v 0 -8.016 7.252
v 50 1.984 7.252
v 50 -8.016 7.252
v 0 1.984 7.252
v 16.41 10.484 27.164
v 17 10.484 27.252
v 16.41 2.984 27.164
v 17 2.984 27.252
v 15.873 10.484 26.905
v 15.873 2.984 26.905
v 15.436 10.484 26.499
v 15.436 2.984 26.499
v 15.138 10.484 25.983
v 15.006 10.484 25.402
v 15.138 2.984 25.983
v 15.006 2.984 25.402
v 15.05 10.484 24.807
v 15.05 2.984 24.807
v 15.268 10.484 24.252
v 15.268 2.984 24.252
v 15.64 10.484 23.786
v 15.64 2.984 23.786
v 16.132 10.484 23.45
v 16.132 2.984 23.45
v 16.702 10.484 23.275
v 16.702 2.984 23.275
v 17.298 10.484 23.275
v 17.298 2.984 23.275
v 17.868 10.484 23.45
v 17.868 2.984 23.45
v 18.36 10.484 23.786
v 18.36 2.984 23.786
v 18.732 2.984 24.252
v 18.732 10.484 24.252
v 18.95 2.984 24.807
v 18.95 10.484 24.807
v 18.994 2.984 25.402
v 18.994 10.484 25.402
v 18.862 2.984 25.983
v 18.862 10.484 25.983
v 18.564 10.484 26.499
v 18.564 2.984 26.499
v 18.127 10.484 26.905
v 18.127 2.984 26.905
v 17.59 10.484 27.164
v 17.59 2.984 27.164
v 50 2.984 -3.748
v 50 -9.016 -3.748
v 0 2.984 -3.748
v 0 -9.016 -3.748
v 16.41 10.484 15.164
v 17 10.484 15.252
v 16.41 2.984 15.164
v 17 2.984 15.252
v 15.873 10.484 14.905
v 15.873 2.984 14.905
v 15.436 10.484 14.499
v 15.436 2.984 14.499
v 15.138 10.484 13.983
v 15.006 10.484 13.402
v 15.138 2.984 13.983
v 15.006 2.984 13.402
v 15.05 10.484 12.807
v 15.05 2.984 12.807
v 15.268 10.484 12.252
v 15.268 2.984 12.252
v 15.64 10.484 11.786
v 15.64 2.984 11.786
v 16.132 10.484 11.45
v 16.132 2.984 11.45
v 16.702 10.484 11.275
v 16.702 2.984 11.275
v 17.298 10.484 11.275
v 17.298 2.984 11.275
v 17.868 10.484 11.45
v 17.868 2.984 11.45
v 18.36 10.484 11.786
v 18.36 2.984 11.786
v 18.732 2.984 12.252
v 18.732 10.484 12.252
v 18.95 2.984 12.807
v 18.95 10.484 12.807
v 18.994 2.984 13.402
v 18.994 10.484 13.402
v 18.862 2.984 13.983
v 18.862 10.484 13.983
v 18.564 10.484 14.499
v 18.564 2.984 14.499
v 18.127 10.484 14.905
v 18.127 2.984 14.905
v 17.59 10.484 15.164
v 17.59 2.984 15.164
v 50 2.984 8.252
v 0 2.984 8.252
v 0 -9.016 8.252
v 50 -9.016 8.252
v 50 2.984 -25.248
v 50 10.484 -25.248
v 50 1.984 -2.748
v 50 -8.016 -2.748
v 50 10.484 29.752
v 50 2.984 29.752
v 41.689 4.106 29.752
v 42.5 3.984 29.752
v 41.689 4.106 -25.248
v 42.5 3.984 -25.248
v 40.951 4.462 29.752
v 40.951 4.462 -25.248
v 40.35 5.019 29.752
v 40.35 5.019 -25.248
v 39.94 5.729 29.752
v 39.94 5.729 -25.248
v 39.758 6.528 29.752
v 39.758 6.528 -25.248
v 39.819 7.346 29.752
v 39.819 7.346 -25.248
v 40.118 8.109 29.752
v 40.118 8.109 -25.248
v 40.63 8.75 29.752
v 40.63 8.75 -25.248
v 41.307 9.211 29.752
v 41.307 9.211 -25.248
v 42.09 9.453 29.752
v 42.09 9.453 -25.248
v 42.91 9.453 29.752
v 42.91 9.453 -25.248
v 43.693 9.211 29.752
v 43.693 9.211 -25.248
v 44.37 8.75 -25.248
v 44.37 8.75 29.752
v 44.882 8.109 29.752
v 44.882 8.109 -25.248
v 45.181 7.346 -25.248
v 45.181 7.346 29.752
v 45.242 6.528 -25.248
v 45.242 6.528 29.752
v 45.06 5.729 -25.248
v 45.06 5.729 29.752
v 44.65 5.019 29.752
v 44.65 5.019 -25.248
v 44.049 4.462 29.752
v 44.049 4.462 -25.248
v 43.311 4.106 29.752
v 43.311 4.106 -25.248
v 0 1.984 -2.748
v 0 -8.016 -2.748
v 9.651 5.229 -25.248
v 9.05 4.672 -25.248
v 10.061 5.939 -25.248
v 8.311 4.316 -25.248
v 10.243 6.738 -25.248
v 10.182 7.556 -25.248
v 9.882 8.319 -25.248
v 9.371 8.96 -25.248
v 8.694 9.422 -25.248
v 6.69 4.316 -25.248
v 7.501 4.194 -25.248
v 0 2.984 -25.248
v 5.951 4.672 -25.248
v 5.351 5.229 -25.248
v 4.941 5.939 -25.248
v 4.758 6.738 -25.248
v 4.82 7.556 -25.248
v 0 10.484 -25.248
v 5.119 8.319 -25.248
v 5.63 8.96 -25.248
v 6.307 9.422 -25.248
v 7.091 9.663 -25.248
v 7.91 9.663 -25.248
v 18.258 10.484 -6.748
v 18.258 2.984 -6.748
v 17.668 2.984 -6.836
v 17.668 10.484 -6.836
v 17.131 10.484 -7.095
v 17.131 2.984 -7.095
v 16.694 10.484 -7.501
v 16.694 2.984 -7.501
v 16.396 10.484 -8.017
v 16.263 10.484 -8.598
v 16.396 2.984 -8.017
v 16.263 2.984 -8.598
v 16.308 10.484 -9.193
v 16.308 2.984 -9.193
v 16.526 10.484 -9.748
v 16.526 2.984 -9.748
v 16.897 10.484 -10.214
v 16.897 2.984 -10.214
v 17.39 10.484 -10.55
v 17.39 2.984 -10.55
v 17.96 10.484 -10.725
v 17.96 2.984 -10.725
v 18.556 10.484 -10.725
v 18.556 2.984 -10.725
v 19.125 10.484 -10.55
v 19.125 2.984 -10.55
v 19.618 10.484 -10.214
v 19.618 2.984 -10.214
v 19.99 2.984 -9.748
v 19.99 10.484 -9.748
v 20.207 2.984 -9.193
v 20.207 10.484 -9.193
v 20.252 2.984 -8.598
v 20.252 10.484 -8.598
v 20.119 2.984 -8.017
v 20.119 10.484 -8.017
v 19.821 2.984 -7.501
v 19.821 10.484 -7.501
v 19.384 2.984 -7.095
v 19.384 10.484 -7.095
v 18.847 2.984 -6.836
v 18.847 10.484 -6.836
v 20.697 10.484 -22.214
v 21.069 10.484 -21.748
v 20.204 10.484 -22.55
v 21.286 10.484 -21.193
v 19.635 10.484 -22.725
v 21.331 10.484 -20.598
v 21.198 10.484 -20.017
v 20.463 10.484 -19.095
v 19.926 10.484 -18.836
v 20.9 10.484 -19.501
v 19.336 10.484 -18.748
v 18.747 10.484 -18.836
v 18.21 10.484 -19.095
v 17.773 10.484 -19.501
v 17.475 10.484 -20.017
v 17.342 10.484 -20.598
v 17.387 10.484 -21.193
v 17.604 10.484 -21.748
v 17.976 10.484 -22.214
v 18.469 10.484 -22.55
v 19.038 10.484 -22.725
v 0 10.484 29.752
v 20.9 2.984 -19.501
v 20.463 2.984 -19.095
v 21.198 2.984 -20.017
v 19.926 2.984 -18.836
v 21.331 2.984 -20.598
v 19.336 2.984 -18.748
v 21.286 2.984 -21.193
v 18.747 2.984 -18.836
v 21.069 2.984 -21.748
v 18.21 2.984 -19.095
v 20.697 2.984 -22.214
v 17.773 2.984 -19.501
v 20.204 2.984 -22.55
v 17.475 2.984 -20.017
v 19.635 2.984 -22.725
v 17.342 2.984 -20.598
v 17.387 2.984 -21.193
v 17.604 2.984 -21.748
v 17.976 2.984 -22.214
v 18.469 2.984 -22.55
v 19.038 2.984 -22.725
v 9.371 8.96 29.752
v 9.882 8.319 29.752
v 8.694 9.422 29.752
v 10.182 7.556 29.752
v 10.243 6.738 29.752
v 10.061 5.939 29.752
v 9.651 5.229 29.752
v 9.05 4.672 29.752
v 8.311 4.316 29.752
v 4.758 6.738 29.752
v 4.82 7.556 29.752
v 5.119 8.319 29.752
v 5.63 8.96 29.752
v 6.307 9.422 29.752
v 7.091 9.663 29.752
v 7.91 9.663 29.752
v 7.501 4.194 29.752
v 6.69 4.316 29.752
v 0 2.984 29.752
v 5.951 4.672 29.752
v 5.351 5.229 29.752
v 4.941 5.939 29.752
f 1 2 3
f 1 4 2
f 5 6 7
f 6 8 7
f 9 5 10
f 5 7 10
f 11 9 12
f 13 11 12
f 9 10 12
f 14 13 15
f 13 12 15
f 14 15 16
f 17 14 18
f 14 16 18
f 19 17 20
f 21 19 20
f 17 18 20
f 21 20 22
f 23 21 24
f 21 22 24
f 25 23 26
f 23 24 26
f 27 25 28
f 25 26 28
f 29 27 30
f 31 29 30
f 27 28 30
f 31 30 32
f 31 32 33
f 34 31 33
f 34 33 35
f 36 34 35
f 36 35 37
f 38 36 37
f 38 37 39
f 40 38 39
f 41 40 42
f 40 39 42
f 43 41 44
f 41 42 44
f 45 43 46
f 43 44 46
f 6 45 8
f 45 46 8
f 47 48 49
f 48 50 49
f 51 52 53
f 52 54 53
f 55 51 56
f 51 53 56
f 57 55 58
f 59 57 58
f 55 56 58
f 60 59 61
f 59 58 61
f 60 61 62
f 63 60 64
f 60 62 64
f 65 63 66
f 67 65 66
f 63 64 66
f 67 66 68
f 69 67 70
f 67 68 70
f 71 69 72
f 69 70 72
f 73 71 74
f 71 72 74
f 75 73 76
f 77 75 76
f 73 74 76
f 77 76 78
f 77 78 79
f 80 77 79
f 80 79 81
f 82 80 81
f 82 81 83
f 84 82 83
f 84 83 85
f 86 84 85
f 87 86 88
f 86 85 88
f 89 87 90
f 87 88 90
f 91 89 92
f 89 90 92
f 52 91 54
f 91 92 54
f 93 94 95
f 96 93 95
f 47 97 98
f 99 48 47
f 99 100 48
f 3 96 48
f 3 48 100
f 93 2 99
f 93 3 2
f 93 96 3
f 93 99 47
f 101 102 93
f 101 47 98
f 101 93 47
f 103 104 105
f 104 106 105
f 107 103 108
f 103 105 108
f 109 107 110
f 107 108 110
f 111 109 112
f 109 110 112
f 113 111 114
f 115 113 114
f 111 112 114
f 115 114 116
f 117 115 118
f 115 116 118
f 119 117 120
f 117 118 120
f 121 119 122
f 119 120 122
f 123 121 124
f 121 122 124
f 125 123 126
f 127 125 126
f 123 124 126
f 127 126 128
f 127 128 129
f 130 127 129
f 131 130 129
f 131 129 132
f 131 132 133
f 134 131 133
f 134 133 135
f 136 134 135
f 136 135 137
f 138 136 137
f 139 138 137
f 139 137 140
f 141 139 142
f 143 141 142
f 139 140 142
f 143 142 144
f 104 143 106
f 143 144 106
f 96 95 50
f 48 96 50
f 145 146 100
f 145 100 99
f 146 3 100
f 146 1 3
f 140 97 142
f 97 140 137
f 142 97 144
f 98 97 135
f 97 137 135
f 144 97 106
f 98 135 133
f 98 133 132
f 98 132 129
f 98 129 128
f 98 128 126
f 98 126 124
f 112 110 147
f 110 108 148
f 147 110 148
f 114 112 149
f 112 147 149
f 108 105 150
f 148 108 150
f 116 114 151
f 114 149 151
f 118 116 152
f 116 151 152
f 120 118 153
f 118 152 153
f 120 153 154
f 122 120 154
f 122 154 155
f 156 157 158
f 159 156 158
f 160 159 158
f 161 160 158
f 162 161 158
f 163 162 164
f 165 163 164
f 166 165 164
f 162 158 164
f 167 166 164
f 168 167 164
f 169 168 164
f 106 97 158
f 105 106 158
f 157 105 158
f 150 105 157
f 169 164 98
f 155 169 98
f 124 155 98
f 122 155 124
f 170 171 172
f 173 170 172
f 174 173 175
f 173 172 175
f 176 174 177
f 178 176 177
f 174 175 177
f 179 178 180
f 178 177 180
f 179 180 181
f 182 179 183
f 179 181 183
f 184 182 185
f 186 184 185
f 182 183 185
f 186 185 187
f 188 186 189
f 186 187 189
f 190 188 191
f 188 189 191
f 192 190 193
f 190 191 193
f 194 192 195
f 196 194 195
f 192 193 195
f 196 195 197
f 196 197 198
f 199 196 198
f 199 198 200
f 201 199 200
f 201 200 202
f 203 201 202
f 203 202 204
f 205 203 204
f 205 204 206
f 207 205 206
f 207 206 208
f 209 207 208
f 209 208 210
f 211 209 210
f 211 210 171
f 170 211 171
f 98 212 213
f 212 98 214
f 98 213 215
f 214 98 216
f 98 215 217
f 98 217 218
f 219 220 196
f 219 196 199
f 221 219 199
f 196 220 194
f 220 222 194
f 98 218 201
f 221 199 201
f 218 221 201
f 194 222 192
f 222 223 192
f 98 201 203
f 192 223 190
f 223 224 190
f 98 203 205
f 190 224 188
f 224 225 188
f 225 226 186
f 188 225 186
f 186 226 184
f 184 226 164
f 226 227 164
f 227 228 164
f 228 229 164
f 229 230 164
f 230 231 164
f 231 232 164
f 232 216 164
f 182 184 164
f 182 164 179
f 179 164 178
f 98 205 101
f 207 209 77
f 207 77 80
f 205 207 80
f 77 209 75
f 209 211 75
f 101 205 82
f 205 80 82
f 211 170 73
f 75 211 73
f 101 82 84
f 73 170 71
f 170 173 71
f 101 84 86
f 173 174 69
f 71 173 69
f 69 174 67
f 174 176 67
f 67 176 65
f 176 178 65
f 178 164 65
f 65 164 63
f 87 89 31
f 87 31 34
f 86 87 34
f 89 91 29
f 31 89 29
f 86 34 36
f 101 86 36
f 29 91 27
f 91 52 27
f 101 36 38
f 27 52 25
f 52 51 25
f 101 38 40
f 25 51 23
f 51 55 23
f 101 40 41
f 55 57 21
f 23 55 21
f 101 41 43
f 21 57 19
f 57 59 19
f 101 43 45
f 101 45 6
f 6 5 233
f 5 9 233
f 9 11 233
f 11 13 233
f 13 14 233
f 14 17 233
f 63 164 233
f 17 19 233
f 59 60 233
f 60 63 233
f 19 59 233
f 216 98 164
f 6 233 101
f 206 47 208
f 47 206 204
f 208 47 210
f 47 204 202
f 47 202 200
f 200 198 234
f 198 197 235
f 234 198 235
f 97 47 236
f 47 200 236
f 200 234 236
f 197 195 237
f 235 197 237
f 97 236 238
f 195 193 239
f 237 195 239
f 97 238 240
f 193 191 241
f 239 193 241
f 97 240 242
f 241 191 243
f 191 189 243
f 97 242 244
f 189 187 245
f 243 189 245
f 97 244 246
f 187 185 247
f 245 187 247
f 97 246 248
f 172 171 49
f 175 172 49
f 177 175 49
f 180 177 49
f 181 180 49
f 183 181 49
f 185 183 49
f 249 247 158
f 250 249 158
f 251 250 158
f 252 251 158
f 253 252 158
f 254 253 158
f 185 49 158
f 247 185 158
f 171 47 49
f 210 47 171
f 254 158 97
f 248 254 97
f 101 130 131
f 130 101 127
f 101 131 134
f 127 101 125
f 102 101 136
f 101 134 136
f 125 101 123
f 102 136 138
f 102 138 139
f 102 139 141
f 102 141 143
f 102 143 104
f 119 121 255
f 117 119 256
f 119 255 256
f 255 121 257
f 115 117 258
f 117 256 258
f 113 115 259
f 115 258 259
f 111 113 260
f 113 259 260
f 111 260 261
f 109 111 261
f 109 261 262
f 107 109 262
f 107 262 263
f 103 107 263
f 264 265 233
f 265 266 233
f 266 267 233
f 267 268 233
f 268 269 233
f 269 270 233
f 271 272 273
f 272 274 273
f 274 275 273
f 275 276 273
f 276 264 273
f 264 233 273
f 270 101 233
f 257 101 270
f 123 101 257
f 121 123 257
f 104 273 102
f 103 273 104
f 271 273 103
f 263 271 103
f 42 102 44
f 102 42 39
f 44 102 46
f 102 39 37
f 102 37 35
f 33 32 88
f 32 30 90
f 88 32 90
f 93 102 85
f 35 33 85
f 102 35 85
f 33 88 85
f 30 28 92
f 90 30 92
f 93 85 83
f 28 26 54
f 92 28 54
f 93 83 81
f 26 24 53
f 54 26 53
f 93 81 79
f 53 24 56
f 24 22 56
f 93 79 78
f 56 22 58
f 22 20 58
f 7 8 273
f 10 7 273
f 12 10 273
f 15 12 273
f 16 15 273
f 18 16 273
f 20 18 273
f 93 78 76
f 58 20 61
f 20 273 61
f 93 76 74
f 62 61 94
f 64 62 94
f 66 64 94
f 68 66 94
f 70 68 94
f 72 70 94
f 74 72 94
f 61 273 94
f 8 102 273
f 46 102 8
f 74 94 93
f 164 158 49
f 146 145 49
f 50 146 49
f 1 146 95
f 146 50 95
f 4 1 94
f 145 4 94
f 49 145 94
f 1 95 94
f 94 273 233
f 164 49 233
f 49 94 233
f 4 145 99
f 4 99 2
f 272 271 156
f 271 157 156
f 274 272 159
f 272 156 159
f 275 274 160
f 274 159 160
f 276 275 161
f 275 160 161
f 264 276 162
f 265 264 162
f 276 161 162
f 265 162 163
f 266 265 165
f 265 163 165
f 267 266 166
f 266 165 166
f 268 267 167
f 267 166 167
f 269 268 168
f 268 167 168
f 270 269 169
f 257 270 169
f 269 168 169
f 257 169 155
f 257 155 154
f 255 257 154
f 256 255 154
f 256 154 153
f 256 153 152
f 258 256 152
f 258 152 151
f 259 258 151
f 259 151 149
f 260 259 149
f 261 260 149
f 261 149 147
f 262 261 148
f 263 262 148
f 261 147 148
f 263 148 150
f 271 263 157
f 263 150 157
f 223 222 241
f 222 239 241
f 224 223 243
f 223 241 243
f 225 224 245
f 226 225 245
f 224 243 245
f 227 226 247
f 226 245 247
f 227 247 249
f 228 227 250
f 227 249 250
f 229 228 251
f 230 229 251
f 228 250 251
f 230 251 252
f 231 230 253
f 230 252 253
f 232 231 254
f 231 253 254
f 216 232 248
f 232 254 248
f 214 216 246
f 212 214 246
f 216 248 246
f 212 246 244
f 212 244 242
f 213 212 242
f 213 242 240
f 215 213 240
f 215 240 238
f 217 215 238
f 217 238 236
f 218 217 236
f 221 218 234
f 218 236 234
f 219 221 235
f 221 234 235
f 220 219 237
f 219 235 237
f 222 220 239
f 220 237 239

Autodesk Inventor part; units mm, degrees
ref_plane "YZ Plane" through (0, 0, 0) normal (1, 0, 0) x (0, 1, 0)
ref_plane "XZ Plane" through (0, 0, 0) normal (0, 1, 0) x (-1, 0, 0)
sketch "Sketch1" plane through (0, 0, 0) normal (1, 0, 0) x (0, 1, 0)
  line L0 (2.9838, 8.2524) -> (-9.0162, 8.2524)
  line L1 (-9.0162, 8.2524) -> (-9.0162, -3.7476)
  line L2 (-9.0162, -3.7476) -> (2.9838, -3.7476)
  line L3 (2.9838, -3.7476) -> (2.9838, 8.2524)
  line L4 (1.9838, 7.2524) -> (-8.0162, 7.2524)
  line L5 (-8.0162, 7.2524) -> (-8.0162, -2.7476)
  line L6 (-8.0162, -2.7476) -> (1.9838, -2.7476)
  line L7 (1.9838, -2.7476) -> (1.9838, 7.2524)
  line L8 (10.4838, 29.7524) -> (2.9838, 29.7524)
  line L9 (2.9838, 29.7524) -> (2.9838, -25.2476)
  line L10 (2.9838, -25.2476) -> (10.4838, -25.2476)
  line L11 (10.4838, -25.2476) -> (10.4838, 29.7524)
  point P0 (0, 0)
  dimension "d0" = 12
  dimension "d1" = 10
  dimension "d2" = 10
  dimension "d3" = 12
  dimension "d4" = 1
  dimension "d5" = 1
  dimension "d22" = 21.5
  dimension "d24" = 55
  dimension "d25" = 7.5
  dimension "d55" = 21.5
extrude "Extrusion1" add sketch "Sketch1" along normal blind 50
ref_plane "Work Plane1" through (0, -9.0162, 2.2524) normal (0, 0, 1) x (1, 0, 0)
sketch "Sketch3" plane through (0, 2.9838, 29.7524) normal (0, 0, 1) x (1, 0, 0)
  line L0 (50, 7.5) -> (50, 0) projected
  line L1 (0, 7.5) -> (50, 7.5) projected
  point P0 (0, -2.9838)
  point P1 (7.5006, 3.9603)
  point P2 (42.5, 3.75)
  dimension "d26" = 35
  dimension "d27" = 7.5
  dimension "d28" = 50
  dimension "d29" = 7.5
  dimension "d30" = 3.75
hole "Hole1" at (42.5, 6.7338, 29.7524) at (7.5006, 6.944, 29.7524) direction (0, 0, -1) diameter 5.5 end through all
sketch "Sketch4" plane through (0, 10.4838, 29.7524) normal (0, 1, 0) x (1, 0, 0)
  line L0 (50, 55) -> (50, 0) projected
  line L1 (0, 0) -> (50, 0) projected
  line L2 (50, 21.5) -> (50, 33.5) projected
  line L3 (0, 55) -> (0, 0) projected
  line L4 (0, 55) -> (50, 55) projected
  point P0 (0, 29.7524)
  point P1 (17, 4.5)
  point P2 (17, 16.5)
  point P3 (19.3365, 50.5)
  point P4 (18.2576, 38.5)
  dimension "d38" = 33
  dimension "d39" = 4.5
  dimension "d40" = 12
  dimension "d57" = 12
  dimension "d58" = 4.5
hole "Hole3" at (19.3365, 10.4838, -20.7476) at (18.2576, 10.4838, -8.7476) at (17, 10.4838, 13.2524) at (17, 10.4838, 25.2524) direction (0, -1, 0) diameter 4 end through all
equation "\"d2\" = d1"
equation "\"d3\" = d0"
equation "\"d5\" = d4"
equation "\"d22\" = d55"
equation "\"d27\" = -0.5 * d26 + 0.5 * d28"
equation "\"d30\" = 0.5 * d29"
equation "\"d57\" = d40"
equation "\"d58\" = d39"
properties part number "fuselage_wing_interface"
